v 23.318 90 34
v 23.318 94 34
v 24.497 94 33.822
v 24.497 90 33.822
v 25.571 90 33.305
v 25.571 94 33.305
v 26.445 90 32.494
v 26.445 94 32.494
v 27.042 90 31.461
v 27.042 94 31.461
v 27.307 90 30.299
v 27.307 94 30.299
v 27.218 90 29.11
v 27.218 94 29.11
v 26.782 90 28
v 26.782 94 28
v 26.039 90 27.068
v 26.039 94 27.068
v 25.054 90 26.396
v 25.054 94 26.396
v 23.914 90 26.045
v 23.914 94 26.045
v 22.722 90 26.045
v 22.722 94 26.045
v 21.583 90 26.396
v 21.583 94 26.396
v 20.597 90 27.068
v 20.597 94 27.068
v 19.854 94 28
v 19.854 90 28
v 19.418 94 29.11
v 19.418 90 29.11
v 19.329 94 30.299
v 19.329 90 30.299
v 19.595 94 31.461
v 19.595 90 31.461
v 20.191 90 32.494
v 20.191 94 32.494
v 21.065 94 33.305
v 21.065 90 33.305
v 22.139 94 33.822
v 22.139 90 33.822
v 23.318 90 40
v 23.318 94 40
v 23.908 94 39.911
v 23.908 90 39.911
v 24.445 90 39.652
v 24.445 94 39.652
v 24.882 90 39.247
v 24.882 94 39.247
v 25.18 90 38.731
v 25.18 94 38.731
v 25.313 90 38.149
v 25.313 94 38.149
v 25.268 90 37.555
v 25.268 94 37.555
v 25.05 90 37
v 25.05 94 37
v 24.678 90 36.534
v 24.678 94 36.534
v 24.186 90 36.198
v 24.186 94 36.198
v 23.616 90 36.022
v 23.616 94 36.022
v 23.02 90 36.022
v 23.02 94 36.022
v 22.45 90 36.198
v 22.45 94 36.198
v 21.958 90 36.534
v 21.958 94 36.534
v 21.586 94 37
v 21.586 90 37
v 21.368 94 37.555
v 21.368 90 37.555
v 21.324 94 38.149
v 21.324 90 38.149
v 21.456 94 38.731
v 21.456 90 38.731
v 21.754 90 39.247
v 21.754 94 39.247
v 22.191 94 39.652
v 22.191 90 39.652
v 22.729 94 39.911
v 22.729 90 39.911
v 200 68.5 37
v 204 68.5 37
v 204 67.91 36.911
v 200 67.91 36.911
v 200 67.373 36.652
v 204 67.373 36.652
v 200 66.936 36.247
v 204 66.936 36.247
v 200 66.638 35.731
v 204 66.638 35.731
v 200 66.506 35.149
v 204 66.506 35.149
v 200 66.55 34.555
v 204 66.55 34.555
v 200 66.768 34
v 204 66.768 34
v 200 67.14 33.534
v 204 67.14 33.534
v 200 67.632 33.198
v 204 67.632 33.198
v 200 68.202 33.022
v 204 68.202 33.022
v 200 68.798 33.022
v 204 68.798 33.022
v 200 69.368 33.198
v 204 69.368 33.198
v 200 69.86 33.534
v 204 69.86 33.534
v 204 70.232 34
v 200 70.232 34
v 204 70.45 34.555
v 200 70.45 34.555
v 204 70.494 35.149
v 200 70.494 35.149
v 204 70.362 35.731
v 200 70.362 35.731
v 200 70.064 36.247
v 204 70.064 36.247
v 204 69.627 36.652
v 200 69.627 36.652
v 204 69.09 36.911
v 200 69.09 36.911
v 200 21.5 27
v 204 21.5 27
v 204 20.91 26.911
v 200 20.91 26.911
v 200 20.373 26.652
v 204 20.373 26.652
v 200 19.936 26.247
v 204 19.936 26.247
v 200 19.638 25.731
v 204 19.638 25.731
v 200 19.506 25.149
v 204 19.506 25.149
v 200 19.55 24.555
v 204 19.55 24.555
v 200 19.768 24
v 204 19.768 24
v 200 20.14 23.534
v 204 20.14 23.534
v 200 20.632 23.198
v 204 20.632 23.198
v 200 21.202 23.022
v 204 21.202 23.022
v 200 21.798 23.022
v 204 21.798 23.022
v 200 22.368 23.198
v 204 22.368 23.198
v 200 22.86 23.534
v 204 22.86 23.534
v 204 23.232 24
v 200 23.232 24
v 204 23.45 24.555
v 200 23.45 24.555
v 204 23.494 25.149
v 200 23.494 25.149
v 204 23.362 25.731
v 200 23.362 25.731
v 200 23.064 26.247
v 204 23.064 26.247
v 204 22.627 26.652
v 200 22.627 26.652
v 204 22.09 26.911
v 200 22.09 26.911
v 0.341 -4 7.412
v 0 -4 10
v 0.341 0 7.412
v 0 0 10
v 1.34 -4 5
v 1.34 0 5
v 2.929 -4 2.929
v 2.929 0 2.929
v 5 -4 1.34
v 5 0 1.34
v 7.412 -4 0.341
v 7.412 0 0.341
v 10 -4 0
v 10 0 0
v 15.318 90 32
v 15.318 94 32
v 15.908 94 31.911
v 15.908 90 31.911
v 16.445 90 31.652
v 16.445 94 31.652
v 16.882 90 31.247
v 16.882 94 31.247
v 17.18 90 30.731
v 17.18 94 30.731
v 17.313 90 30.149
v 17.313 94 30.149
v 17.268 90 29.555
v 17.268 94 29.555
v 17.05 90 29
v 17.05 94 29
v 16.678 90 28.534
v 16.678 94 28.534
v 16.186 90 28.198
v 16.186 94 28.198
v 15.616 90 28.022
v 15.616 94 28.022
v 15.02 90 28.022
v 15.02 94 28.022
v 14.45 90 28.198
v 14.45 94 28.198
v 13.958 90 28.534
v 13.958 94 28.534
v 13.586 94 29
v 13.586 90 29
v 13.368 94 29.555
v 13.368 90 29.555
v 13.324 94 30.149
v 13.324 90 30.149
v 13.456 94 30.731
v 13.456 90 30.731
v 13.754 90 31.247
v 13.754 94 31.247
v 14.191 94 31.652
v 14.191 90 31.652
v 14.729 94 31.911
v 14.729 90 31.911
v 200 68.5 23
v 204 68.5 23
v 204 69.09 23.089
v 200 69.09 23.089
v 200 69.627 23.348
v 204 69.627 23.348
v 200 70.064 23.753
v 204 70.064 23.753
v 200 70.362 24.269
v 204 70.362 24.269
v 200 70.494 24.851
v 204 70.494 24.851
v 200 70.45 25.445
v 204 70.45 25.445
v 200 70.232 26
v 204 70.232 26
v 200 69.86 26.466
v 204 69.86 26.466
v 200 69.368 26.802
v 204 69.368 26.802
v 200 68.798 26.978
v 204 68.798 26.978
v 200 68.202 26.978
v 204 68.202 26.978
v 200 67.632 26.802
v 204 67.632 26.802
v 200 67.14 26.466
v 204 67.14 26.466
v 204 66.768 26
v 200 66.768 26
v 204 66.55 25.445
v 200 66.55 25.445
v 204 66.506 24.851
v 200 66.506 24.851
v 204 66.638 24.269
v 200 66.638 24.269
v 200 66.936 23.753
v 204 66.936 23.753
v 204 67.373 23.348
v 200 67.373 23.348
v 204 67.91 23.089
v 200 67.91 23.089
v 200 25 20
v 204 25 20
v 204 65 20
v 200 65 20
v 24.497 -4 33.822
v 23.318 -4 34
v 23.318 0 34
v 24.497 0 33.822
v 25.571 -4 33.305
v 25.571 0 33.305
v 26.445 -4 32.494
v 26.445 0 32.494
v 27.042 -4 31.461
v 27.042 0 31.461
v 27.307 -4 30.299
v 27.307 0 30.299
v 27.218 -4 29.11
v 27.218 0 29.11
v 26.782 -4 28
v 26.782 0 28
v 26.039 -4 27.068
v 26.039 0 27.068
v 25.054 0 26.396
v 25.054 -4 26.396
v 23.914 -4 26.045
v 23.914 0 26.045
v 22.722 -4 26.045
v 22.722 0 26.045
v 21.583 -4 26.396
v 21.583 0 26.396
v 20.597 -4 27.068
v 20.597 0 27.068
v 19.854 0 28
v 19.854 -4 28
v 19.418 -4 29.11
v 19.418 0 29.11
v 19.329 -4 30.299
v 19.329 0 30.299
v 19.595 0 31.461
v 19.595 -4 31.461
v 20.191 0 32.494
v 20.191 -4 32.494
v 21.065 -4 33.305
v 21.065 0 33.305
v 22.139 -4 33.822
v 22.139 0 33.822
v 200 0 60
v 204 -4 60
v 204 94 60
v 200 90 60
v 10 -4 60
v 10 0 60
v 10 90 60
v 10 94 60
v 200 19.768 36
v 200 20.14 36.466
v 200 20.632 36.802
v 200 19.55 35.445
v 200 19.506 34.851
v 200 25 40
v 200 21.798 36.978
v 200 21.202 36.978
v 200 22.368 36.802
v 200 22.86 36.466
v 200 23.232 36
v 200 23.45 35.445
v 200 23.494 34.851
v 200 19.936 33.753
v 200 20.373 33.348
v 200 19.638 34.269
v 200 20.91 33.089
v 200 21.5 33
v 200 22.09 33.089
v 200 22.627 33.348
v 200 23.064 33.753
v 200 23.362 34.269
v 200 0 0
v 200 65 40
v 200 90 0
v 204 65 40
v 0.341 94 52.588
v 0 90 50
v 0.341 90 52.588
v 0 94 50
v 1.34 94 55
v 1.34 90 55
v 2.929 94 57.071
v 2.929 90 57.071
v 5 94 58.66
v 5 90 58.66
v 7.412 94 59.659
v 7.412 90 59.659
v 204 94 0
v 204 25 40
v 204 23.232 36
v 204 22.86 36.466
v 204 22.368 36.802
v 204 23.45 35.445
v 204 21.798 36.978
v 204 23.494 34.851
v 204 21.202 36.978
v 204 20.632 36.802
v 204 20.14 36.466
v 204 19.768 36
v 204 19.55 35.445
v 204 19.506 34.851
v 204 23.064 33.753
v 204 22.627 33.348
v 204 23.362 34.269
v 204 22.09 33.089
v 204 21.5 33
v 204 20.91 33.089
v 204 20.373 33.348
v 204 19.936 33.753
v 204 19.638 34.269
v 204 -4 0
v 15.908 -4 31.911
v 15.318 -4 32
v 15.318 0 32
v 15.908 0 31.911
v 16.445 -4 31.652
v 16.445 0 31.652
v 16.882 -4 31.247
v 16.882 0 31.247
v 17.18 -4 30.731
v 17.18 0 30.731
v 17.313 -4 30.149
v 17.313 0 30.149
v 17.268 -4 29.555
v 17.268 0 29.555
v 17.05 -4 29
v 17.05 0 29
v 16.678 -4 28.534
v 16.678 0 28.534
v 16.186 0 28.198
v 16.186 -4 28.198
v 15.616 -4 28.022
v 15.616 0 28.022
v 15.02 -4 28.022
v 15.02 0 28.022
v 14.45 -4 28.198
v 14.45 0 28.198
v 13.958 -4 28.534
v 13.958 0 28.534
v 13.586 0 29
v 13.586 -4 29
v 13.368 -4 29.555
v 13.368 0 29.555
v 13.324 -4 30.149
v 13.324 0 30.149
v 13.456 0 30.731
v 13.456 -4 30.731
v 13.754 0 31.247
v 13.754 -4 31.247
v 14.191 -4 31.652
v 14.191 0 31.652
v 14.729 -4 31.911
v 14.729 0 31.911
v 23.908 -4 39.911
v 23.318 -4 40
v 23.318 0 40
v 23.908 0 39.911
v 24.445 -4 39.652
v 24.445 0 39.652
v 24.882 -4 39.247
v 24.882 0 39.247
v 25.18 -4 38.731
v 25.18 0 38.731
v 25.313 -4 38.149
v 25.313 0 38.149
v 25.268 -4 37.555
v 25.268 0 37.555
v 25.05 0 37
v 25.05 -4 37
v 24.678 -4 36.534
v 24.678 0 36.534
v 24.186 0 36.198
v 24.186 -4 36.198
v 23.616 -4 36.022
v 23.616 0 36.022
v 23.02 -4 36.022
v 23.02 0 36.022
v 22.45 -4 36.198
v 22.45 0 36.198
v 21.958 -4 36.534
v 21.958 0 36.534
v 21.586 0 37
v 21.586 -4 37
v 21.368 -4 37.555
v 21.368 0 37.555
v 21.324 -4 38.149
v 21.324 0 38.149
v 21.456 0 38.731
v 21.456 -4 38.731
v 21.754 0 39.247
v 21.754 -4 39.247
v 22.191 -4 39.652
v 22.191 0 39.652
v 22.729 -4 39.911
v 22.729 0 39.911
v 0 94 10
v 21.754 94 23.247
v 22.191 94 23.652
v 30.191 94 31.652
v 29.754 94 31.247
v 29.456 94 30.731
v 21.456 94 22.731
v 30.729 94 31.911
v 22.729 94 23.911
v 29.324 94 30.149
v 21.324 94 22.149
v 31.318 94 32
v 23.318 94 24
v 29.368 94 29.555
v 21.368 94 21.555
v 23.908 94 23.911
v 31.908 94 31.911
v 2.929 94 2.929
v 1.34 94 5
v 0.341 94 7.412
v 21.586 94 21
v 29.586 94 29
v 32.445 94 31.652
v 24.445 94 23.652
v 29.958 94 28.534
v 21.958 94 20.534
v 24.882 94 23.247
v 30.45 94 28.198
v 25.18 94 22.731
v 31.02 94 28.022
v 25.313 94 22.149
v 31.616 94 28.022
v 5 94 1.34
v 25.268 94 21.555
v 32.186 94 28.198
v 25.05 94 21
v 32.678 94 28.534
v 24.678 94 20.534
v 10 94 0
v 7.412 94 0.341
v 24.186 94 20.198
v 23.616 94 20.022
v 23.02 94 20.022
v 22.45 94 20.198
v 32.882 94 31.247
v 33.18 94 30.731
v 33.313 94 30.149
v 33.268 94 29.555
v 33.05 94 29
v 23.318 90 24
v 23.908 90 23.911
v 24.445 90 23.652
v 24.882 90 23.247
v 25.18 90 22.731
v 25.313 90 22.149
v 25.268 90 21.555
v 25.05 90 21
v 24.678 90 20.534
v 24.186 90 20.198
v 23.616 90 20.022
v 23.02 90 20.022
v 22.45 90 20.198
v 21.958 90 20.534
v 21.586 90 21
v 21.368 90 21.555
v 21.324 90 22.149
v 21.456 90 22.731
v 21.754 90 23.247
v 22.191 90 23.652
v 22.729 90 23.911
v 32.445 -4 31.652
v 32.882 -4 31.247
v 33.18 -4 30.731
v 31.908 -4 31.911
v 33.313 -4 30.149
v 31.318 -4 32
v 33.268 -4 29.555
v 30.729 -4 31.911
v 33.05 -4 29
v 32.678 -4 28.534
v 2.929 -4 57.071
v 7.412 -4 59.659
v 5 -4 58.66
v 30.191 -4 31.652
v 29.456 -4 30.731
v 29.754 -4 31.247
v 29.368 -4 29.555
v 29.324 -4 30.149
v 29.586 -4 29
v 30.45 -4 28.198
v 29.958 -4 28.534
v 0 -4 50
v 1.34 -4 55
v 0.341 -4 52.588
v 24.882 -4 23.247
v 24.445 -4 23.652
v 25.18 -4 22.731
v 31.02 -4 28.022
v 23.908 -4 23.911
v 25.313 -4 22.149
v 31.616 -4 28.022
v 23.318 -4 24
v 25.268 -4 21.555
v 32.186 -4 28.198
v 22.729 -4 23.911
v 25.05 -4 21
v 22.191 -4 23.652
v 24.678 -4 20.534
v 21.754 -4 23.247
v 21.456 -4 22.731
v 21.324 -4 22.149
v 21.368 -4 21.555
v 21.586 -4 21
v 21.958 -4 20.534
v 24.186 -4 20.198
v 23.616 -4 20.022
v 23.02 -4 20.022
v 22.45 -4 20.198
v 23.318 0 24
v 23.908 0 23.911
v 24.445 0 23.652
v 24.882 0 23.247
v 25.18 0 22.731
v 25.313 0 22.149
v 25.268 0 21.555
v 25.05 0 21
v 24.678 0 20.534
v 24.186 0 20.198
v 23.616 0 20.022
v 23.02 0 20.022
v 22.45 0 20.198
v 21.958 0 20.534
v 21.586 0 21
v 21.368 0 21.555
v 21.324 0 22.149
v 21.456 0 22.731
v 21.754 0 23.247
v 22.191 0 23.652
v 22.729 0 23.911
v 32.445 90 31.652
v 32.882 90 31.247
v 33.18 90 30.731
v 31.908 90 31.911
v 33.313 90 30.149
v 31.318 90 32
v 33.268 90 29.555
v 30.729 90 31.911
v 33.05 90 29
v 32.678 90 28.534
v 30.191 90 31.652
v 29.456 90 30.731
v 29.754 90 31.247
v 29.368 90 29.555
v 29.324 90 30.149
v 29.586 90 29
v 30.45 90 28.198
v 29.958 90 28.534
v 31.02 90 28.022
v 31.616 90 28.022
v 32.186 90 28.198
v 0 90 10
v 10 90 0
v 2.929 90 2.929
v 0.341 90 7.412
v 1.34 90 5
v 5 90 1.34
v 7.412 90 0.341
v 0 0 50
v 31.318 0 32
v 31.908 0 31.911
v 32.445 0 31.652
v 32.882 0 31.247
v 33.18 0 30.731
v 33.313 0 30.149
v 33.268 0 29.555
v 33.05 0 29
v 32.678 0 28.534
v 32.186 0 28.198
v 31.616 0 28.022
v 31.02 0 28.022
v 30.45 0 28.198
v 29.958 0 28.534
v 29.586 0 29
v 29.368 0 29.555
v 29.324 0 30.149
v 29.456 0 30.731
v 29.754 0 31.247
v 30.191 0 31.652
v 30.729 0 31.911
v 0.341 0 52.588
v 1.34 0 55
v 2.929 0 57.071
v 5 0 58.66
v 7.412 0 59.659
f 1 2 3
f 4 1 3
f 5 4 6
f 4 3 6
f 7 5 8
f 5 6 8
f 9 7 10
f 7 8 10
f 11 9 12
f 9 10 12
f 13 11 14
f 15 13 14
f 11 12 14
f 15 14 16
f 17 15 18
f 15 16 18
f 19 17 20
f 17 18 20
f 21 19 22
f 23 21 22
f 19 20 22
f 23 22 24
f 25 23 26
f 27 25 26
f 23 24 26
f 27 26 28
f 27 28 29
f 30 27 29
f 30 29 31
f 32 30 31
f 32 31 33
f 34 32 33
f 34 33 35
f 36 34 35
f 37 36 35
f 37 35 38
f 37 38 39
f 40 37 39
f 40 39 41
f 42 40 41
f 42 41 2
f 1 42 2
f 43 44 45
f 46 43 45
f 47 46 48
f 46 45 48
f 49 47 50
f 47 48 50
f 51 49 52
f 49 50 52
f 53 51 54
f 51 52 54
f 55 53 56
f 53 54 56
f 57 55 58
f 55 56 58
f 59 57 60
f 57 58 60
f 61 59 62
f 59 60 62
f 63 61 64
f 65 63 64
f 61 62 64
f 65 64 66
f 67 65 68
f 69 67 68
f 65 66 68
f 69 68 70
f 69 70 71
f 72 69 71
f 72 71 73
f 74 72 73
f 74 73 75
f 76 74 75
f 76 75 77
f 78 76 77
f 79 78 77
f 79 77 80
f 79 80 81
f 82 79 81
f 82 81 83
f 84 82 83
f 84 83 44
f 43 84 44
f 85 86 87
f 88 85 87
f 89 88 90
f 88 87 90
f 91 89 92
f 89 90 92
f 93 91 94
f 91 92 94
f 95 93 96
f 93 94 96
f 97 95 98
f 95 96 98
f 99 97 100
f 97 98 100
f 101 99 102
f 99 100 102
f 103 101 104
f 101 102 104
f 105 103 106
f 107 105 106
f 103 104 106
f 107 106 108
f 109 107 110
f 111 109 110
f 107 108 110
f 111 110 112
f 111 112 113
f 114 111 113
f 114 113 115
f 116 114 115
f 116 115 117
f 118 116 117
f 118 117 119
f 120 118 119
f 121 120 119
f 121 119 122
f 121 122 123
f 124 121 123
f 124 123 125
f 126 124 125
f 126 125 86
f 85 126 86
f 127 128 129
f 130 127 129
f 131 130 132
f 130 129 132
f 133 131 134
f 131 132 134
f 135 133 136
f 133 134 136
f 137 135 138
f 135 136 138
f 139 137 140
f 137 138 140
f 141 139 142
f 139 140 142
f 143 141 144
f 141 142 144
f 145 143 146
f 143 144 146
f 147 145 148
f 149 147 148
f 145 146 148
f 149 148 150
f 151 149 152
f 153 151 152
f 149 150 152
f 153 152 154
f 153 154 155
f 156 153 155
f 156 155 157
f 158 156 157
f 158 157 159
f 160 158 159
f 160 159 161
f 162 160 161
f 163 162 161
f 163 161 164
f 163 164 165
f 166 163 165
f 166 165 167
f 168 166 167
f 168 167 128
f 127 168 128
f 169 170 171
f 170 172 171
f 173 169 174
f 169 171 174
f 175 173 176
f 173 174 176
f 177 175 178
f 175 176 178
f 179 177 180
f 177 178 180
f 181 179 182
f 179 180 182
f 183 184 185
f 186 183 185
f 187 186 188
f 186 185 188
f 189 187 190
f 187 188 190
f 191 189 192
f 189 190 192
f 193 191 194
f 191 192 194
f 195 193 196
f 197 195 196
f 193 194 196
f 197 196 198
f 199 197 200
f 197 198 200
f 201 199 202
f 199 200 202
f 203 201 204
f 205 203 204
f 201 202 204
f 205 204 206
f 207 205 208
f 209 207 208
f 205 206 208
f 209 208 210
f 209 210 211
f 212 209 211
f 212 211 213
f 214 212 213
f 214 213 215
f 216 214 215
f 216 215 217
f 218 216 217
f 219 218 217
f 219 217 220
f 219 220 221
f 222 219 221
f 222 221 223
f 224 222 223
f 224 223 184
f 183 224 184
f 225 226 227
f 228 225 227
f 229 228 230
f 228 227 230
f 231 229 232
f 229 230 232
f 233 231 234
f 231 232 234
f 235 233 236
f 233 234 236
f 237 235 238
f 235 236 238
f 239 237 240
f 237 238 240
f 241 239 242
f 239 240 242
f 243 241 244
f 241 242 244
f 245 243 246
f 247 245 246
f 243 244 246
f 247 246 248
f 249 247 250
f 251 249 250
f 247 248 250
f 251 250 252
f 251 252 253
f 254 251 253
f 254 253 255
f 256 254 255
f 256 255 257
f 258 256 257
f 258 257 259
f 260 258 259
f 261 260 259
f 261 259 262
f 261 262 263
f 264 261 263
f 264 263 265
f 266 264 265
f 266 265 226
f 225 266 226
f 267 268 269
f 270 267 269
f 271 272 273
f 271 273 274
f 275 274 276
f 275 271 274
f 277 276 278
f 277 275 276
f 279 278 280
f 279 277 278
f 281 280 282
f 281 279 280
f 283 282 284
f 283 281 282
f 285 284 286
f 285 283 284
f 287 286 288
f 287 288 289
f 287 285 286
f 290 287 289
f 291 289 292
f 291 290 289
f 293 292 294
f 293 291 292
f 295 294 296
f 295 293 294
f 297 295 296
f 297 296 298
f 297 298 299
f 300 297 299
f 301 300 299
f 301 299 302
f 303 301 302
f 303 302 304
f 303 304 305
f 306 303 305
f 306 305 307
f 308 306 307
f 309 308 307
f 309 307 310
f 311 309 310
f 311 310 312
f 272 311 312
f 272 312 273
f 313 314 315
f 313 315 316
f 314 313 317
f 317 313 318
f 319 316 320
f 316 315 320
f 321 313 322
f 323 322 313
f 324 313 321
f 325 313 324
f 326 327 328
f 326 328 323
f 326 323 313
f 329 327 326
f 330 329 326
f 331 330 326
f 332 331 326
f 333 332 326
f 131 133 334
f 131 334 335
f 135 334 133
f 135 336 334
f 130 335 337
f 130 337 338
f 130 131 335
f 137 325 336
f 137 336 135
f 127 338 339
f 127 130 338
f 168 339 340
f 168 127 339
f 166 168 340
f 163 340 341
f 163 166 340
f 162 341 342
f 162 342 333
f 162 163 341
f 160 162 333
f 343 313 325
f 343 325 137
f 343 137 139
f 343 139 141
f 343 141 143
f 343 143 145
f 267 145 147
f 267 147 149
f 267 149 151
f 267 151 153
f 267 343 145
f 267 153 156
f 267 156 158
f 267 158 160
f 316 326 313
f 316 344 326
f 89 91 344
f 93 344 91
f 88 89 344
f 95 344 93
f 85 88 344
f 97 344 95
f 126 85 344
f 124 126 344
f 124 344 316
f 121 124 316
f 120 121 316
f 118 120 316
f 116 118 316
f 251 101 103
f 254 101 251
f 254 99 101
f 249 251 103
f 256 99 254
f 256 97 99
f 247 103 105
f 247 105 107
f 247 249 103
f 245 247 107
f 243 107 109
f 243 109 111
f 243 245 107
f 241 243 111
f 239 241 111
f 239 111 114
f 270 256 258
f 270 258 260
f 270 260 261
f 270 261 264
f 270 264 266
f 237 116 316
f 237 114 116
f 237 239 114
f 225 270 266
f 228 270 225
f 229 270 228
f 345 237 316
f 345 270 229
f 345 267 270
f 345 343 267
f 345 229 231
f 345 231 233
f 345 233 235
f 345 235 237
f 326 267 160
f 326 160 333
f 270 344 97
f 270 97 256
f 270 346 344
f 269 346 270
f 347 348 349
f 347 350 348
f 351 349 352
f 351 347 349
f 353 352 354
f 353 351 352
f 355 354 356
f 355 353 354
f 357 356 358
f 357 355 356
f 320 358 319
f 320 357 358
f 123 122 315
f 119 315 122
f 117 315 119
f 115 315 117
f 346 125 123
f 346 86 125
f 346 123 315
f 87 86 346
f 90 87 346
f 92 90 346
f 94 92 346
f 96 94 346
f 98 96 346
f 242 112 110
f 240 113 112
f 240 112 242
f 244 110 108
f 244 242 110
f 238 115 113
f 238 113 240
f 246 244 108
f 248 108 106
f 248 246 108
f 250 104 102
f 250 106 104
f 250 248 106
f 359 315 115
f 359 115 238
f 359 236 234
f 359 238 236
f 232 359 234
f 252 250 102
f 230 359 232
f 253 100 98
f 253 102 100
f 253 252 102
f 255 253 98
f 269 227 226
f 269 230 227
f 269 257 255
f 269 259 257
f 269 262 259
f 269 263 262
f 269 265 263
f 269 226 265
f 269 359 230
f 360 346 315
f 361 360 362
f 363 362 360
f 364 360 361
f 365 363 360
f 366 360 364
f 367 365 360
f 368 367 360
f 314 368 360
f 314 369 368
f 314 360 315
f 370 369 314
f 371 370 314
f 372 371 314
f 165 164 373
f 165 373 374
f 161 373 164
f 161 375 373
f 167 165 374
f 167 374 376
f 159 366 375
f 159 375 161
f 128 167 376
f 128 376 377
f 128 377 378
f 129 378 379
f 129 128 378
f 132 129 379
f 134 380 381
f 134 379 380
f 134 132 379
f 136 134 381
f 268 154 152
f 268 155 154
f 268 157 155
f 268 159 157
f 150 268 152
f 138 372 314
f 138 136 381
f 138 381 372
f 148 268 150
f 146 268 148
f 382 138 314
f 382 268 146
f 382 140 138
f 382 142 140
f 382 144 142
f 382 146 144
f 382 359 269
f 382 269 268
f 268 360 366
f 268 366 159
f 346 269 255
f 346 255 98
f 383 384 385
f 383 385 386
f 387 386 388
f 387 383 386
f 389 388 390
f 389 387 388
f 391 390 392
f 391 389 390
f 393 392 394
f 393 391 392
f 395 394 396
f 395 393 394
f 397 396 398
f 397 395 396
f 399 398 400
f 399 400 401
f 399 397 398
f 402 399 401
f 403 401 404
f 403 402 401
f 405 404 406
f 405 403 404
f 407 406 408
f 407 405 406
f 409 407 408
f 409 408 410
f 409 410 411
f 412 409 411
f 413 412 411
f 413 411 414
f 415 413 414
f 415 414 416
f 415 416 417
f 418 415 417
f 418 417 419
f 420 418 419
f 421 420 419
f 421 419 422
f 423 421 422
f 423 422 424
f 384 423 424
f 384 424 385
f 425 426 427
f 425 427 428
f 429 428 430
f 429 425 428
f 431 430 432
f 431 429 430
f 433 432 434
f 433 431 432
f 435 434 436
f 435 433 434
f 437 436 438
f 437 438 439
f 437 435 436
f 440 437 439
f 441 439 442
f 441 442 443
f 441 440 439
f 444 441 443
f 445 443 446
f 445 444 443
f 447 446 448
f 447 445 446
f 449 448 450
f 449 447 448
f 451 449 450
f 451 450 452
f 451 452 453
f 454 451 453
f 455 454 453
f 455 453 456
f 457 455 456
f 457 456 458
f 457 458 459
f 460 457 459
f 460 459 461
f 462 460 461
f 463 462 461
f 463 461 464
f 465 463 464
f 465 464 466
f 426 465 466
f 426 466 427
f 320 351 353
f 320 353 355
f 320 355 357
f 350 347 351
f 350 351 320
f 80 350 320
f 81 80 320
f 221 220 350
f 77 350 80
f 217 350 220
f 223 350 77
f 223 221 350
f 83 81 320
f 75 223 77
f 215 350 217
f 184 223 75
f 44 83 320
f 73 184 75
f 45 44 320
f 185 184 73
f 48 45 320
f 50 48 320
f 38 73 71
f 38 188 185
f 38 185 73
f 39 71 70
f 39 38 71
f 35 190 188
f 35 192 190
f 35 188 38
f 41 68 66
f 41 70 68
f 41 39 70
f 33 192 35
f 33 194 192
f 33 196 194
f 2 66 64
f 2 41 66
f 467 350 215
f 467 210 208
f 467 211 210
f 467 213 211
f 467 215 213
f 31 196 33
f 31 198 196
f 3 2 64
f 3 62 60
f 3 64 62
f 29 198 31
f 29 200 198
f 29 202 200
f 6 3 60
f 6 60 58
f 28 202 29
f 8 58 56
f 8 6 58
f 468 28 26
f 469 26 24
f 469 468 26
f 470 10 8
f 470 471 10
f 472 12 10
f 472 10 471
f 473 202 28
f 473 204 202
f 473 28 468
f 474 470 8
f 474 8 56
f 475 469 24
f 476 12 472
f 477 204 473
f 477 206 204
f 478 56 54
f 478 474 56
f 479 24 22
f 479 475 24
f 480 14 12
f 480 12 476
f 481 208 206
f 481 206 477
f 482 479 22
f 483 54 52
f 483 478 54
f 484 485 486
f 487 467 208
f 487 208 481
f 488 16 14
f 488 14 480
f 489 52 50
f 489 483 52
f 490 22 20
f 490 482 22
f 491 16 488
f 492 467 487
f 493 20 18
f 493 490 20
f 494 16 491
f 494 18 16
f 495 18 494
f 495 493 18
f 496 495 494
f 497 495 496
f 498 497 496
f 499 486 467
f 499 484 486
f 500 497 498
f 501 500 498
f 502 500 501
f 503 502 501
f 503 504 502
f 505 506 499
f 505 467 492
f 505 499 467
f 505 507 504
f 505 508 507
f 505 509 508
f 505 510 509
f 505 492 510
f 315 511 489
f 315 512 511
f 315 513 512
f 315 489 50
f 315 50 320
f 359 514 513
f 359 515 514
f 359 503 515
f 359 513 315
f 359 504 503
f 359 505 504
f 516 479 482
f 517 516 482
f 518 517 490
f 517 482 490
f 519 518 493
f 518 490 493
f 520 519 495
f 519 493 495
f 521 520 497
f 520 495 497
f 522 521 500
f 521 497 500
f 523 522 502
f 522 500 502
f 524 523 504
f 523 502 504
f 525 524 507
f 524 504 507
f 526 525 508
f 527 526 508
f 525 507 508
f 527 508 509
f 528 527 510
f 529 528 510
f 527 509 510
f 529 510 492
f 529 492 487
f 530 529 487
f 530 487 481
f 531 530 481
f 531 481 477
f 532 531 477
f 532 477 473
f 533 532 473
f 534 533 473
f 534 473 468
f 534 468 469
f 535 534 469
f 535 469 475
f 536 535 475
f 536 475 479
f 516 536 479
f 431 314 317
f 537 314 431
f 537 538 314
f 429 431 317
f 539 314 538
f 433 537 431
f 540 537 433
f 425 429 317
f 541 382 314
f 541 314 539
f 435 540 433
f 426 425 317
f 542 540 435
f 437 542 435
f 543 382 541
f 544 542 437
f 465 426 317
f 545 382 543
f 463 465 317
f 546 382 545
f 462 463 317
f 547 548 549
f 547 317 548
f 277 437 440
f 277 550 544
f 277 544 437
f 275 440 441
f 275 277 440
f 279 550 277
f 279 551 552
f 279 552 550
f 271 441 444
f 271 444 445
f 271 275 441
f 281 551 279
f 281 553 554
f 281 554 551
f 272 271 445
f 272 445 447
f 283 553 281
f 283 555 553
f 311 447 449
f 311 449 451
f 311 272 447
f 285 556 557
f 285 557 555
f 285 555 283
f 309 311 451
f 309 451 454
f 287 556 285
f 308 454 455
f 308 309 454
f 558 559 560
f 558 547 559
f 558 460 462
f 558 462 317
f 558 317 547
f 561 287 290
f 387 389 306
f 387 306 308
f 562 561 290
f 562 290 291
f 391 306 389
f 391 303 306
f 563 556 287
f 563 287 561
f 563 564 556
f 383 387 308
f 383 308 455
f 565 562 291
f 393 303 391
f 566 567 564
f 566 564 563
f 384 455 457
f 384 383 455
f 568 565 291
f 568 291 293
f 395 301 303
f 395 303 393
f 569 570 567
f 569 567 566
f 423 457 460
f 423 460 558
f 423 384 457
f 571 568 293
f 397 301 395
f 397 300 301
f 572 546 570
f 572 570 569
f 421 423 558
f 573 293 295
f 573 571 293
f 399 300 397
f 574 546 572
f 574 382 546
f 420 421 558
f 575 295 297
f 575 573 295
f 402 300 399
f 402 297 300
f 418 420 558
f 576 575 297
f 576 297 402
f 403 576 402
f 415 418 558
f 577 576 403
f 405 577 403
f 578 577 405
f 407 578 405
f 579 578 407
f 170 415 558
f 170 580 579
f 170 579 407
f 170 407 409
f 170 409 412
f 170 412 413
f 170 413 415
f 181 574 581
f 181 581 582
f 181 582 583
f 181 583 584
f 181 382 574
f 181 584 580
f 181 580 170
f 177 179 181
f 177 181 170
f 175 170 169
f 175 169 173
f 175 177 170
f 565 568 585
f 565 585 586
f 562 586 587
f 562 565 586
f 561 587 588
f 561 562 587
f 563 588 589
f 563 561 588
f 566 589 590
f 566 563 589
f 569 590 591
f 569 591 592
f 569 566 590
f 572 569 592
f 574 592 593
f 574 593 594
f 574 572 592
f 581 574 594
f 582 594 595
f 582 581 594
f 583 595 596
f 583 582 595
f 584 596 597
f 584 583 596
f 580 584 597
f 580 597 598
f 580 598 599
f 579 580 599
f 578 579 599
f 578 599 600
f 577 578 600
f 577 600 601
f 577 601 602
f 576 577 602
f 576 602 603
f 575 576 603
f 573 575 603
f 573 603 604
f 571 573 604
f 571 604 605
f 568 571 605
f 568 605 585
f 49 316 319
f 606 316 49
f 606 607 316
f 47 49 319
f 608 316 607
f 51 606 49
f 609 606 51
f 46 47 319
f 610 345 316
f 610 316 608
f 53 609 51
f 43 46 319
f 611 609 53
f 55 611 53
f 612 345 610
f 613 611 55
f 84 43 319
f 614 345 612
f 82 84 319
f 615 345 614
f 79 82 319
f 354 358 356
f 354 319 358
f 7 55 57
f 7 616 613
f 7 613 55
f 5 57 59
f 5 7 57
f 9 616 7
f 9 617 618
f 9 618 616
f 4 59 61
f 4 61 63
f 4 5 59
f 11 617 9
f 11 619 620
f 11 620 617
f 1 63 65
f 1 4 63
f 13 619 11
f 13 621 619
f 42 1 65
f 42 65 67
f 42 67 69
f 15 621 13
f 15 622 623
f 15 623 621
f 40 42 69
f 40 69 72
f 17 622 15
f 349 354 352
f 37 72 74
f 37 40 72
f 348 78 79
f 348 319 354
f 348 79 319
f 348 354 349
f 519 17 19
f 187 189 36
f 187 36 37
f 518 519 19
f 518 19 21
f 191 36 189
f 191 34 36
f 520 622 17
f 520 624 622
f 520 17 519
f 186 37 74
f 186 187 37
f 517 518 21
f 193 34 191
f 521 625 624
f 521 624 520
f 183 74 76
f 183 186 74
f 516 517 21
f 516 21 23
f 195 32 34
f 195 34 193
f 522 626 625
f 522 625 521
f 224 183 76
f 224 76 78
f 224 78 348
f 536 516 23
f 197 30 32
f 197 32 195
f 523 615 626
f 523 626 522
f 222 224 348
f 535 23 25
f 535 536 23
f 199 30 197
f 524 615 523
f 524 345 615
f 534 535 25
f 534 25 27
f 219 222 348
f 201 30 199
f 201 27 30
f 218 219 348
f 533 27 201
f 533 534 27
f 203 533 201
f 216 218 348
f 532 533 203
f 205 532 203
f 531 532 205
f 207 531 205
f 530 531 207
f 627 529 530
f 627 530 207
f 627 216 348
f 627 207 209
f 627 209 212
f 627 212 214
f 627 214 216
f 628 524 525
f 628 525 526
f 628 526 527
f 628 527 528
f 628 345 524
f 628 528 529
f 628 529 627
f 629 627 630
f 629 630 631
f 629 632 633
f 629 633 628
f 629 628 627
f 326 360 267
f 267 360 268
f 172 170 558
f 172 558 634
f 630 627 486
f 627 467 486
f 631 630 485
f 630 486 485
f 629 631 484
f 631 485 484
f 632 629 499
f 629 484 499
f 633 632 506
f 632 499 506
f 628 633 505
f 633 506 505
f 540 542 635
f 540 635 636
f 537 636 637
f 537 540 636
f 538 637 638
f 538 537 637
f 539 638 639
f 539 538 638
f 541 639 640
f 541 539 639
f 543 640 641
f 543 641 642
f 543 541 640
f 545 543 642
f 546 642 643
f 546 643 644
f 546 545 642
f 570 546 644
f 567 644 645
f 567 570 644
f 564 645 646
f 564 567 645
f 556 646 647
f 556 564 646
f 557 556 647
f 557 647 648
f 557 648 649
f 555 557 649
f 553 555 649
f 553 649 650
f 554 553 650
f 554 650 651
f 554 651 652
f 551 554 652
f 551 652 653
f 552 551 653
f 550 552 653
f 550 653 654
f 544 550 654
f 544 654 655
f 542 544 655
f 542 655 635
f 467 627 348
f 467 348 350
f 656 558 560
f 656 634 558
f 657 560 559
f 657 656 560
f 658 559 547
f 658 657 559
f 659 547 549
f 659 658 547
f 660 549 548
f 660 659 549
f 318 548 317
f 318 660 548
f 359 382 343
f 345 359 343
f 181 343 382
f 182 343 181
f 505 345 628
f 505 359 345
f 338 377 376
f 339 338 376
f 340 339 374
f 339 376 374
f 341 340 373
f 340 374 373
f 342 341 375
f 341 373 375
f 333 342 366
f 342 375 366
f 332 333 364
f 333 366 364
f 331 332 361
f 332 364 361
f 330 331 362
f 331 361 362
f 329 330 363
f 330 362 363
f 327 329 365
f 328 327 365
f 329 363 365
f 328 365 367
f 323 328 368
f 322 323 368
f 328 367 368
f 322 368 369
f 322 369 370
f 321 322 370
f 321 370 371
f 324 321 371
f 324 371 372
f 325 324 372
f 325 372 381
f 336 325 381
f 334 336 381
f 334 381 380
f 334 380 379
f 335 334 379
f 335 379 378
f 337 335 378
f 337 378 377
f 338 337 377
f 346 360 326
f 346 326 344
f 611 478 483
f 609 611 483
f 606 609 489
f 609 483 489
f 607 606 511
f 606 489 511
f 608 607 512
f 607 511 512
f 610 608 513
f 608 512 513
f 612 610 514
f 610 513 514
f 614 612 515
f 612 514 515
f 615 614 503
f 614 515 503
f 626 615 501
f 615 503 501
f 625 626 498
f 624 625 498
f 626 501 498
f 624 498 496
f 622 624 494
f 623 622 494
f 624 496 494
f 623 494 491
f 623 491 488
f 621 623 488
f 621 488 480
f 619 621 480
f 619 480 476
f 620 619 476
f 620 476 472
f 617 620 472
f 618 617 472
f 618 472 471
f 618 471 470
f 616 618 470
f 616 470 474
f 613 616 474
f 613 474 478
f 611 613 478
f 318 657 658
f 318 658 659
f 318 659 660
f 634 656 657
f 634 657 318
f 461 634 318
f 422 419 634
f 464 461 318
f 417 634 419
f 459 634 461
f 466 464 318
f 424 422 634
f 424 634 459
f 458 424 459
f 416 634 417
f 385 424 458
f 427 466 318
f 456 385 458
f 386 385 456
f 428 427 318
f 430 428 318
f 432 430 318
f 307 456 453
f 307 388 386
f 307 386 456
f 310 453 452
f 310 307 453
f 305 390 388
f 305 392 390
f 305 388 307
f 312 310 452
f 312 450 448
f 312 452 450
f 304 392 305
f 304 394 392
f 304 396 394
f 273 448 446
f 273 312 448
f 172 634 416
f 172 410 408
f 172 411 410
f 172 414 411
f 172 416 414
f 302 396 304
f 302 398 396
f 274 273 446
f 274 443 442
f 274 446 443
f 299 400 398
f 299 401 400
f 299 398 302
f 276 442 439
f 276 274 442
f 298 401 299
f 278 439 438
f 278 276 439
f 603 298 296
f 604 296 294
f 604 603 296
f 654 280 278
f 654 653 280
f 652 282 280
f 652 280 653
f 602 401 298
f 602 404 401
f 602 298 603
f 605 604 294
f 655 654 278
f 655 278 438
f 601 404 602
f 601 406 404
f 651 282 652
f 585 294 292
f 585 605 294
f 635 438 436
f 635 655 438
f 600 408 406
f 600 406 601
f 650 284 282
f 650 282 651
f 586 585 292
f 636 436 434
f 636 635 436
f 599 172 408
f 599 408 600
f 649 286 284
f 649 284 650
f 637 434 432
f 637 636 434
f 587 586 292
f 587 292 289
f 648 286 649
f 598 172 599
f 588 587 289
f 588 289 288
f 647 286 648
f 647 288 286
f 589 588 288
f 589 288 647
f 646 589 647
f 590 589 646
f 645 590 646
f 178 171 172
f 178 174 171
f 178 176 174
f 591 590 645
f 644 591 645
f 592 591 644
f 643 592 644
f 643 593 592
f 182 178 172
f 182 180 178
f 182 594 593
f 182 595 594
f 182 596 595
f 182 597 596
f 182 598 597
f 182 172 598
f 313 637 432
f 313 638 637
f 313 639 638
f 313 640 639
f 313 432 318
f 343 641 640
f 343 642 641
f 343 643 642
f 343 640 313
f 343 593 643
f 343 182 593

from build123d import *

# Parameters (mm, degrees)
EKSTR_ZYON_NCE1_DEPTH = 60
RADYUS1_R             = 10
KES_EKSTR_ZYON1_REACH = 236.137
IZIM2_R               = 4
IZIM2_R_2             = 2
KES_EKSTR_ZYON2_REACH = 234.491
IZIM3_R               = 2
IZIM3_W               = 20
IZIM3_H               = 40


with BuildPart() as part:
    # Çizim1 → Ekstrüzyon-İnce1 (new body)
    with BuildSketch(Plane.XY):
        Polygon((0, 0), (200, 0), (200, 90), (0, 90), (0, 94), (204, 94), (204, -4), (0, -4), align=None)
    extrude(amount=EKSTR_ZYON_NCE1_DEPTH)

    # Radyus1
    radyus1_edges = [part.edges().sort_by_distance(p)[0] for p in [
        (0, -2, 60),
        (0, 92, 60),
        (0, -2, 0),
        (0, 92, 0),
    ]]
    fillet(radyus1_edges, radius=RADYUS1_R)

    # Çizim2 → Kes-Ekstrüzyon1 (cut, up to next)
    with BuildSketch(Plane(origin=(0, 94, 0), x_dir=(1, 0, 0), z_dir=(0, 1, 0)), mode=Mode.PRIVATE) as kes_ekstr_zyon1_sk1:
        with Locations(Location((23.318126504, -30, 0), (0, 0, 270))):
            Circle(IZIM2_R)
    kes_ekstr_zyon1_tool1 = extrude(kes_ekstr_zyon1_sk1.sketch, amount=-KES_EKSTR_ZYON1_REACH, mode=Mode.PRIVATE) & part.part
    # Çizim2 → Kes-Ekstrüzyon1 (cut, up to next)
    with BuildSketch(Plane(origin=(0, 94, 0), x_dir=(1, 0, 0), z_dir=(0, 1, 0)), mode=Mode.PRIVATE) as kes_ekstr_zyon1_sk2:
        with Locations(Location((23.318126504, -22, 0), (0, 0, 270))):
            Circle(IZIM2_R_2)
    kes_ekstr_zyon1_tool2 = extrude(kes_ekstr_zyon1_sk2.sketch, amount=-KES_EKSTR_ZYON1_REACH, mode=Mode.PRIVATE) & part.part
    # Çizim2 → Kes-Ekstrüzyon1 (cut, up to next)
    with BuildSketch(Plane(origin=(0, 94, 0), x_dir=(1, 0, 0), z_dir=(0, 1, 0)), mode=Mode.PRIVATE) as kes_ekstr_zyon1_sk3:
        with Locations(Location((23.318126504, -38, 0), (0, 0, 270))):
            Circle(IZIM2_R_2)
    kes_ekstr_zyon1_tool3 = extrude(kes_ekstr_zyon1_sk3.sketch, amount=-KES_EKSTR_ZYON1_REACH, mode=Mode.PRIVATE) & part.part
    # Çizim2 → Kes-Ekstrüzyon1 (cut, up to next)
    with BuildSketch(Plane(origin=(0, 94, 0), x_dir=(1, 0, 0), z_dir=(0, 1, 0)), mode=Mode.PRIVATE) as kes_ekstr_zyon1_sk4:
        with Locations(Location((31.318126504, -30, 0), (0, 0, 270))):
            Circle(IZIM2_R_2)
    kes_ekstr_zyon1_tool4 = extrude(kes_ekstr_zyon1_sk4.sketch, amount=-KES_EKSTR_ZYON1_REACH, mode=Mode.PRIVATE) & part.part
    # Çizim2 → Kes-Ekstrüzyon1 (cut, up to next)
    with BuildSketch(Plane(origin=(0, 94, 0), x_dir=(1, 0, 0), z_dir=(0, 1, 0)), mode=Mode.PRIVATE) as kes_ekstr_zyon1_sk5:
        with Locations(Location((15.318126504, -30, 0), (0, 0, 270))):
            Circle(IZIM2_R_2)
    kes_ekstr_zyon1_tool5 = extrude(kes_ekstr_zyon1_sk5.sketch, amount=-KES_EKSTR_ZYON1_REACH, mode=Mode.PRIVATE) & part.part
    kes_ekstr_zyon1_1 = kes_ekstr_zyon1_tool1.solids().sort_by_distance((23.318127, 94, 30))[0]
    add(kes_ekstr_zyon1_1, mode=Mode.SUBTRACT)
    kes_ekstr_zyon1_2 = kes_ekstr_zyon1_tool2.solids().sort_by_distance((23.318127, 94, 22))[0]
    add(kes_ekstr_zyon1_2, mode=Mode.SUBTRACT)
    kes_ekstr_zyon1_3 = kes_ekstr_zyon1_tool3.solids().sort_by_distance((23.318127, 94, 38))[0]
    add(kes_ekstr_zyon1_3, mode=Mode.SUBTRACT)
    kes_ekstr_zyon1_4 = kes_ekstr_zyon1_tool4.solids().sort_by_distance((31.318127, 94, 30))[0]
    add(kes_ekstr_zyon1_4, mode=Mode.SUBTRACT)
    kes_ekstr_zyon1_5 = kes_ekstr_zyon1_tool5.solids().sort_by_distance((15.318127, 94, 30))[0]
    add(kes_ekstr_zyon1_5, mode=Mode.SUBTRACT)
    kes_ekstr_zyon1 = kes_ekstr_zyon1_1 + kes_ekstr_zyon1_2 + kes_ekstr_zyon1_3 + kes_ekstr_zyon1_4 + kes_ekstr_zyon1_5  # Kes-Ekstrüzyon1 as one shape, for the pattern or mirror that repeats it

    # Aynalama1: Kes-Ekstrüzyon1 across plane
    add(kes_ekstr_zyon1.mirror(Plane.ZX.offset(45)), mode=Mode.SUBTRACT)

    # Çizim3 → Kes-Ekstrüzyon2 (cut, up to next)
    with BuildSketch(Plane(origin=(204, 0, 0), x_dir=(0, 0, -1), z_dir=(1, 0, 0)), mode=Mode.PRIVATE) as kes_ekstr_zyon2_sk1:
        with Locations((-25, 68.5)):
            Circle(IZIM3_R)
    kes_ekstr_zyon2_tool1 = extrude(kes_ekstr_zyon2_sk1.sketch, amount=-KES_EKSTR_ZYON2_REACH, mode=Mode.PRIVATE) & part.part
    # Çizim3 → Kes-Ekstrüzyon2 (cut, up to next)
    with BuildSketch(Plane(origin=(204, 0, 0), x_dir=(0, 0, -1), z_dir=(1, 0, 0)), mode=Mode.PRIVATE) as kes_ekstr_zyon2_sk2:
        with Locations(Location((-35, 68.5, 0), (0, 0, 180))):
            Circle(IZIM3_R)
    kes_ekstr_zyon2_tool2 = extrude(kes_ekstr_zyon2_sk2.sketch, amount=-KES_EKSTR_ZYON2_REACH, mode=Mode.PRIVATE) & part.part
    # Çizim3 → Kes-Ekstrüzyon2 (cut, up to next)
    with BuildSketch(Plane(origin=(204, 0, 0), x_dir=(0, 0, -1), z_dir=(1, 0, 0)), mode=Mode.PRIVATE) as kes_ekstr_zyon2_sk3:
        with Locations(Location((-25, 21.5, 0), (0, 0, 180))):
            Circle(IZIM3_R)
    kes_ekstr_zyon2_tool3 = extrude(kes_ekstr_zyon2_sk3.sketch, amount=-KES_EKSTR_ZYON2_REACH, mode=Mode.PRIVATE) & part.part
    # Çizim3 → Kes-Ekstrüzyon2 (cut, up to next)
    with BuildSketch(Plane(origin=(204, 0, 0), x_dir=(0, 0, -1), z_dir=(1, 0, 0)), mode=Mode.PRIVATE) as kes_ekstr_zyon2_sk4:
        with Locations((-35, 21.5)):
            Circle(IZIM3_R)
    kes_ekstr_zyon2_tool4 = extrude(kes_ekstr_zyon2_sk4.sketch, amount=-KES_EKSTR_ZYON2_REACH, mode=Mode.PRIVATE) & part.part
    # Çizim3 → Kes-Ekstrüzyon2 (cut, up to next)
    with BuildSketch(Plane(origin=(204, 0, 0), x_dir=(0, 0, -1), z_dir=(1, 0, 0)), mode=Mode.PRIVATE) as kes_ekstr_zyon2_sk5:
        with Locations((-30, 45)):
            Rectangle(IZIM3_W, IZIM3_H)
    kes_ekstr_zyon2_tool5 = extrude(kes_ekstr_zyon2_sk5.sketch, amount=-KES_EKSTR_ZYON2_REACH, mode=Mode.PRIVATE) & part.part
    add(kes_ekstr_zyon2_tool1.solids().sort_by_distance((204, 68.5, 25))[0], mode=Mode.SUBTRACT)
    add(kes_ekstr_zyon2_tool2.solids().sort_by_distance((204, 68.5, 35))[0], mode=Mode.SUBTRACT)
    add(kes_ekstr_zyon2_tool3.solids().sort_by_distance((204, 21.5, 25))[0], mode=Mode.SUBTRACT)
    add(kes_ekstr_zyon2_tool4.solids().sort_by_distance((204, 21.5, 35))[0], mode=Mode.SUBTRACT)
    add(kes_ekstr_zyon2_tool5.solids().sort_by_distance((204, 45, 30))[0], mode=Mode.SUBTRACT)


solid = part.part
